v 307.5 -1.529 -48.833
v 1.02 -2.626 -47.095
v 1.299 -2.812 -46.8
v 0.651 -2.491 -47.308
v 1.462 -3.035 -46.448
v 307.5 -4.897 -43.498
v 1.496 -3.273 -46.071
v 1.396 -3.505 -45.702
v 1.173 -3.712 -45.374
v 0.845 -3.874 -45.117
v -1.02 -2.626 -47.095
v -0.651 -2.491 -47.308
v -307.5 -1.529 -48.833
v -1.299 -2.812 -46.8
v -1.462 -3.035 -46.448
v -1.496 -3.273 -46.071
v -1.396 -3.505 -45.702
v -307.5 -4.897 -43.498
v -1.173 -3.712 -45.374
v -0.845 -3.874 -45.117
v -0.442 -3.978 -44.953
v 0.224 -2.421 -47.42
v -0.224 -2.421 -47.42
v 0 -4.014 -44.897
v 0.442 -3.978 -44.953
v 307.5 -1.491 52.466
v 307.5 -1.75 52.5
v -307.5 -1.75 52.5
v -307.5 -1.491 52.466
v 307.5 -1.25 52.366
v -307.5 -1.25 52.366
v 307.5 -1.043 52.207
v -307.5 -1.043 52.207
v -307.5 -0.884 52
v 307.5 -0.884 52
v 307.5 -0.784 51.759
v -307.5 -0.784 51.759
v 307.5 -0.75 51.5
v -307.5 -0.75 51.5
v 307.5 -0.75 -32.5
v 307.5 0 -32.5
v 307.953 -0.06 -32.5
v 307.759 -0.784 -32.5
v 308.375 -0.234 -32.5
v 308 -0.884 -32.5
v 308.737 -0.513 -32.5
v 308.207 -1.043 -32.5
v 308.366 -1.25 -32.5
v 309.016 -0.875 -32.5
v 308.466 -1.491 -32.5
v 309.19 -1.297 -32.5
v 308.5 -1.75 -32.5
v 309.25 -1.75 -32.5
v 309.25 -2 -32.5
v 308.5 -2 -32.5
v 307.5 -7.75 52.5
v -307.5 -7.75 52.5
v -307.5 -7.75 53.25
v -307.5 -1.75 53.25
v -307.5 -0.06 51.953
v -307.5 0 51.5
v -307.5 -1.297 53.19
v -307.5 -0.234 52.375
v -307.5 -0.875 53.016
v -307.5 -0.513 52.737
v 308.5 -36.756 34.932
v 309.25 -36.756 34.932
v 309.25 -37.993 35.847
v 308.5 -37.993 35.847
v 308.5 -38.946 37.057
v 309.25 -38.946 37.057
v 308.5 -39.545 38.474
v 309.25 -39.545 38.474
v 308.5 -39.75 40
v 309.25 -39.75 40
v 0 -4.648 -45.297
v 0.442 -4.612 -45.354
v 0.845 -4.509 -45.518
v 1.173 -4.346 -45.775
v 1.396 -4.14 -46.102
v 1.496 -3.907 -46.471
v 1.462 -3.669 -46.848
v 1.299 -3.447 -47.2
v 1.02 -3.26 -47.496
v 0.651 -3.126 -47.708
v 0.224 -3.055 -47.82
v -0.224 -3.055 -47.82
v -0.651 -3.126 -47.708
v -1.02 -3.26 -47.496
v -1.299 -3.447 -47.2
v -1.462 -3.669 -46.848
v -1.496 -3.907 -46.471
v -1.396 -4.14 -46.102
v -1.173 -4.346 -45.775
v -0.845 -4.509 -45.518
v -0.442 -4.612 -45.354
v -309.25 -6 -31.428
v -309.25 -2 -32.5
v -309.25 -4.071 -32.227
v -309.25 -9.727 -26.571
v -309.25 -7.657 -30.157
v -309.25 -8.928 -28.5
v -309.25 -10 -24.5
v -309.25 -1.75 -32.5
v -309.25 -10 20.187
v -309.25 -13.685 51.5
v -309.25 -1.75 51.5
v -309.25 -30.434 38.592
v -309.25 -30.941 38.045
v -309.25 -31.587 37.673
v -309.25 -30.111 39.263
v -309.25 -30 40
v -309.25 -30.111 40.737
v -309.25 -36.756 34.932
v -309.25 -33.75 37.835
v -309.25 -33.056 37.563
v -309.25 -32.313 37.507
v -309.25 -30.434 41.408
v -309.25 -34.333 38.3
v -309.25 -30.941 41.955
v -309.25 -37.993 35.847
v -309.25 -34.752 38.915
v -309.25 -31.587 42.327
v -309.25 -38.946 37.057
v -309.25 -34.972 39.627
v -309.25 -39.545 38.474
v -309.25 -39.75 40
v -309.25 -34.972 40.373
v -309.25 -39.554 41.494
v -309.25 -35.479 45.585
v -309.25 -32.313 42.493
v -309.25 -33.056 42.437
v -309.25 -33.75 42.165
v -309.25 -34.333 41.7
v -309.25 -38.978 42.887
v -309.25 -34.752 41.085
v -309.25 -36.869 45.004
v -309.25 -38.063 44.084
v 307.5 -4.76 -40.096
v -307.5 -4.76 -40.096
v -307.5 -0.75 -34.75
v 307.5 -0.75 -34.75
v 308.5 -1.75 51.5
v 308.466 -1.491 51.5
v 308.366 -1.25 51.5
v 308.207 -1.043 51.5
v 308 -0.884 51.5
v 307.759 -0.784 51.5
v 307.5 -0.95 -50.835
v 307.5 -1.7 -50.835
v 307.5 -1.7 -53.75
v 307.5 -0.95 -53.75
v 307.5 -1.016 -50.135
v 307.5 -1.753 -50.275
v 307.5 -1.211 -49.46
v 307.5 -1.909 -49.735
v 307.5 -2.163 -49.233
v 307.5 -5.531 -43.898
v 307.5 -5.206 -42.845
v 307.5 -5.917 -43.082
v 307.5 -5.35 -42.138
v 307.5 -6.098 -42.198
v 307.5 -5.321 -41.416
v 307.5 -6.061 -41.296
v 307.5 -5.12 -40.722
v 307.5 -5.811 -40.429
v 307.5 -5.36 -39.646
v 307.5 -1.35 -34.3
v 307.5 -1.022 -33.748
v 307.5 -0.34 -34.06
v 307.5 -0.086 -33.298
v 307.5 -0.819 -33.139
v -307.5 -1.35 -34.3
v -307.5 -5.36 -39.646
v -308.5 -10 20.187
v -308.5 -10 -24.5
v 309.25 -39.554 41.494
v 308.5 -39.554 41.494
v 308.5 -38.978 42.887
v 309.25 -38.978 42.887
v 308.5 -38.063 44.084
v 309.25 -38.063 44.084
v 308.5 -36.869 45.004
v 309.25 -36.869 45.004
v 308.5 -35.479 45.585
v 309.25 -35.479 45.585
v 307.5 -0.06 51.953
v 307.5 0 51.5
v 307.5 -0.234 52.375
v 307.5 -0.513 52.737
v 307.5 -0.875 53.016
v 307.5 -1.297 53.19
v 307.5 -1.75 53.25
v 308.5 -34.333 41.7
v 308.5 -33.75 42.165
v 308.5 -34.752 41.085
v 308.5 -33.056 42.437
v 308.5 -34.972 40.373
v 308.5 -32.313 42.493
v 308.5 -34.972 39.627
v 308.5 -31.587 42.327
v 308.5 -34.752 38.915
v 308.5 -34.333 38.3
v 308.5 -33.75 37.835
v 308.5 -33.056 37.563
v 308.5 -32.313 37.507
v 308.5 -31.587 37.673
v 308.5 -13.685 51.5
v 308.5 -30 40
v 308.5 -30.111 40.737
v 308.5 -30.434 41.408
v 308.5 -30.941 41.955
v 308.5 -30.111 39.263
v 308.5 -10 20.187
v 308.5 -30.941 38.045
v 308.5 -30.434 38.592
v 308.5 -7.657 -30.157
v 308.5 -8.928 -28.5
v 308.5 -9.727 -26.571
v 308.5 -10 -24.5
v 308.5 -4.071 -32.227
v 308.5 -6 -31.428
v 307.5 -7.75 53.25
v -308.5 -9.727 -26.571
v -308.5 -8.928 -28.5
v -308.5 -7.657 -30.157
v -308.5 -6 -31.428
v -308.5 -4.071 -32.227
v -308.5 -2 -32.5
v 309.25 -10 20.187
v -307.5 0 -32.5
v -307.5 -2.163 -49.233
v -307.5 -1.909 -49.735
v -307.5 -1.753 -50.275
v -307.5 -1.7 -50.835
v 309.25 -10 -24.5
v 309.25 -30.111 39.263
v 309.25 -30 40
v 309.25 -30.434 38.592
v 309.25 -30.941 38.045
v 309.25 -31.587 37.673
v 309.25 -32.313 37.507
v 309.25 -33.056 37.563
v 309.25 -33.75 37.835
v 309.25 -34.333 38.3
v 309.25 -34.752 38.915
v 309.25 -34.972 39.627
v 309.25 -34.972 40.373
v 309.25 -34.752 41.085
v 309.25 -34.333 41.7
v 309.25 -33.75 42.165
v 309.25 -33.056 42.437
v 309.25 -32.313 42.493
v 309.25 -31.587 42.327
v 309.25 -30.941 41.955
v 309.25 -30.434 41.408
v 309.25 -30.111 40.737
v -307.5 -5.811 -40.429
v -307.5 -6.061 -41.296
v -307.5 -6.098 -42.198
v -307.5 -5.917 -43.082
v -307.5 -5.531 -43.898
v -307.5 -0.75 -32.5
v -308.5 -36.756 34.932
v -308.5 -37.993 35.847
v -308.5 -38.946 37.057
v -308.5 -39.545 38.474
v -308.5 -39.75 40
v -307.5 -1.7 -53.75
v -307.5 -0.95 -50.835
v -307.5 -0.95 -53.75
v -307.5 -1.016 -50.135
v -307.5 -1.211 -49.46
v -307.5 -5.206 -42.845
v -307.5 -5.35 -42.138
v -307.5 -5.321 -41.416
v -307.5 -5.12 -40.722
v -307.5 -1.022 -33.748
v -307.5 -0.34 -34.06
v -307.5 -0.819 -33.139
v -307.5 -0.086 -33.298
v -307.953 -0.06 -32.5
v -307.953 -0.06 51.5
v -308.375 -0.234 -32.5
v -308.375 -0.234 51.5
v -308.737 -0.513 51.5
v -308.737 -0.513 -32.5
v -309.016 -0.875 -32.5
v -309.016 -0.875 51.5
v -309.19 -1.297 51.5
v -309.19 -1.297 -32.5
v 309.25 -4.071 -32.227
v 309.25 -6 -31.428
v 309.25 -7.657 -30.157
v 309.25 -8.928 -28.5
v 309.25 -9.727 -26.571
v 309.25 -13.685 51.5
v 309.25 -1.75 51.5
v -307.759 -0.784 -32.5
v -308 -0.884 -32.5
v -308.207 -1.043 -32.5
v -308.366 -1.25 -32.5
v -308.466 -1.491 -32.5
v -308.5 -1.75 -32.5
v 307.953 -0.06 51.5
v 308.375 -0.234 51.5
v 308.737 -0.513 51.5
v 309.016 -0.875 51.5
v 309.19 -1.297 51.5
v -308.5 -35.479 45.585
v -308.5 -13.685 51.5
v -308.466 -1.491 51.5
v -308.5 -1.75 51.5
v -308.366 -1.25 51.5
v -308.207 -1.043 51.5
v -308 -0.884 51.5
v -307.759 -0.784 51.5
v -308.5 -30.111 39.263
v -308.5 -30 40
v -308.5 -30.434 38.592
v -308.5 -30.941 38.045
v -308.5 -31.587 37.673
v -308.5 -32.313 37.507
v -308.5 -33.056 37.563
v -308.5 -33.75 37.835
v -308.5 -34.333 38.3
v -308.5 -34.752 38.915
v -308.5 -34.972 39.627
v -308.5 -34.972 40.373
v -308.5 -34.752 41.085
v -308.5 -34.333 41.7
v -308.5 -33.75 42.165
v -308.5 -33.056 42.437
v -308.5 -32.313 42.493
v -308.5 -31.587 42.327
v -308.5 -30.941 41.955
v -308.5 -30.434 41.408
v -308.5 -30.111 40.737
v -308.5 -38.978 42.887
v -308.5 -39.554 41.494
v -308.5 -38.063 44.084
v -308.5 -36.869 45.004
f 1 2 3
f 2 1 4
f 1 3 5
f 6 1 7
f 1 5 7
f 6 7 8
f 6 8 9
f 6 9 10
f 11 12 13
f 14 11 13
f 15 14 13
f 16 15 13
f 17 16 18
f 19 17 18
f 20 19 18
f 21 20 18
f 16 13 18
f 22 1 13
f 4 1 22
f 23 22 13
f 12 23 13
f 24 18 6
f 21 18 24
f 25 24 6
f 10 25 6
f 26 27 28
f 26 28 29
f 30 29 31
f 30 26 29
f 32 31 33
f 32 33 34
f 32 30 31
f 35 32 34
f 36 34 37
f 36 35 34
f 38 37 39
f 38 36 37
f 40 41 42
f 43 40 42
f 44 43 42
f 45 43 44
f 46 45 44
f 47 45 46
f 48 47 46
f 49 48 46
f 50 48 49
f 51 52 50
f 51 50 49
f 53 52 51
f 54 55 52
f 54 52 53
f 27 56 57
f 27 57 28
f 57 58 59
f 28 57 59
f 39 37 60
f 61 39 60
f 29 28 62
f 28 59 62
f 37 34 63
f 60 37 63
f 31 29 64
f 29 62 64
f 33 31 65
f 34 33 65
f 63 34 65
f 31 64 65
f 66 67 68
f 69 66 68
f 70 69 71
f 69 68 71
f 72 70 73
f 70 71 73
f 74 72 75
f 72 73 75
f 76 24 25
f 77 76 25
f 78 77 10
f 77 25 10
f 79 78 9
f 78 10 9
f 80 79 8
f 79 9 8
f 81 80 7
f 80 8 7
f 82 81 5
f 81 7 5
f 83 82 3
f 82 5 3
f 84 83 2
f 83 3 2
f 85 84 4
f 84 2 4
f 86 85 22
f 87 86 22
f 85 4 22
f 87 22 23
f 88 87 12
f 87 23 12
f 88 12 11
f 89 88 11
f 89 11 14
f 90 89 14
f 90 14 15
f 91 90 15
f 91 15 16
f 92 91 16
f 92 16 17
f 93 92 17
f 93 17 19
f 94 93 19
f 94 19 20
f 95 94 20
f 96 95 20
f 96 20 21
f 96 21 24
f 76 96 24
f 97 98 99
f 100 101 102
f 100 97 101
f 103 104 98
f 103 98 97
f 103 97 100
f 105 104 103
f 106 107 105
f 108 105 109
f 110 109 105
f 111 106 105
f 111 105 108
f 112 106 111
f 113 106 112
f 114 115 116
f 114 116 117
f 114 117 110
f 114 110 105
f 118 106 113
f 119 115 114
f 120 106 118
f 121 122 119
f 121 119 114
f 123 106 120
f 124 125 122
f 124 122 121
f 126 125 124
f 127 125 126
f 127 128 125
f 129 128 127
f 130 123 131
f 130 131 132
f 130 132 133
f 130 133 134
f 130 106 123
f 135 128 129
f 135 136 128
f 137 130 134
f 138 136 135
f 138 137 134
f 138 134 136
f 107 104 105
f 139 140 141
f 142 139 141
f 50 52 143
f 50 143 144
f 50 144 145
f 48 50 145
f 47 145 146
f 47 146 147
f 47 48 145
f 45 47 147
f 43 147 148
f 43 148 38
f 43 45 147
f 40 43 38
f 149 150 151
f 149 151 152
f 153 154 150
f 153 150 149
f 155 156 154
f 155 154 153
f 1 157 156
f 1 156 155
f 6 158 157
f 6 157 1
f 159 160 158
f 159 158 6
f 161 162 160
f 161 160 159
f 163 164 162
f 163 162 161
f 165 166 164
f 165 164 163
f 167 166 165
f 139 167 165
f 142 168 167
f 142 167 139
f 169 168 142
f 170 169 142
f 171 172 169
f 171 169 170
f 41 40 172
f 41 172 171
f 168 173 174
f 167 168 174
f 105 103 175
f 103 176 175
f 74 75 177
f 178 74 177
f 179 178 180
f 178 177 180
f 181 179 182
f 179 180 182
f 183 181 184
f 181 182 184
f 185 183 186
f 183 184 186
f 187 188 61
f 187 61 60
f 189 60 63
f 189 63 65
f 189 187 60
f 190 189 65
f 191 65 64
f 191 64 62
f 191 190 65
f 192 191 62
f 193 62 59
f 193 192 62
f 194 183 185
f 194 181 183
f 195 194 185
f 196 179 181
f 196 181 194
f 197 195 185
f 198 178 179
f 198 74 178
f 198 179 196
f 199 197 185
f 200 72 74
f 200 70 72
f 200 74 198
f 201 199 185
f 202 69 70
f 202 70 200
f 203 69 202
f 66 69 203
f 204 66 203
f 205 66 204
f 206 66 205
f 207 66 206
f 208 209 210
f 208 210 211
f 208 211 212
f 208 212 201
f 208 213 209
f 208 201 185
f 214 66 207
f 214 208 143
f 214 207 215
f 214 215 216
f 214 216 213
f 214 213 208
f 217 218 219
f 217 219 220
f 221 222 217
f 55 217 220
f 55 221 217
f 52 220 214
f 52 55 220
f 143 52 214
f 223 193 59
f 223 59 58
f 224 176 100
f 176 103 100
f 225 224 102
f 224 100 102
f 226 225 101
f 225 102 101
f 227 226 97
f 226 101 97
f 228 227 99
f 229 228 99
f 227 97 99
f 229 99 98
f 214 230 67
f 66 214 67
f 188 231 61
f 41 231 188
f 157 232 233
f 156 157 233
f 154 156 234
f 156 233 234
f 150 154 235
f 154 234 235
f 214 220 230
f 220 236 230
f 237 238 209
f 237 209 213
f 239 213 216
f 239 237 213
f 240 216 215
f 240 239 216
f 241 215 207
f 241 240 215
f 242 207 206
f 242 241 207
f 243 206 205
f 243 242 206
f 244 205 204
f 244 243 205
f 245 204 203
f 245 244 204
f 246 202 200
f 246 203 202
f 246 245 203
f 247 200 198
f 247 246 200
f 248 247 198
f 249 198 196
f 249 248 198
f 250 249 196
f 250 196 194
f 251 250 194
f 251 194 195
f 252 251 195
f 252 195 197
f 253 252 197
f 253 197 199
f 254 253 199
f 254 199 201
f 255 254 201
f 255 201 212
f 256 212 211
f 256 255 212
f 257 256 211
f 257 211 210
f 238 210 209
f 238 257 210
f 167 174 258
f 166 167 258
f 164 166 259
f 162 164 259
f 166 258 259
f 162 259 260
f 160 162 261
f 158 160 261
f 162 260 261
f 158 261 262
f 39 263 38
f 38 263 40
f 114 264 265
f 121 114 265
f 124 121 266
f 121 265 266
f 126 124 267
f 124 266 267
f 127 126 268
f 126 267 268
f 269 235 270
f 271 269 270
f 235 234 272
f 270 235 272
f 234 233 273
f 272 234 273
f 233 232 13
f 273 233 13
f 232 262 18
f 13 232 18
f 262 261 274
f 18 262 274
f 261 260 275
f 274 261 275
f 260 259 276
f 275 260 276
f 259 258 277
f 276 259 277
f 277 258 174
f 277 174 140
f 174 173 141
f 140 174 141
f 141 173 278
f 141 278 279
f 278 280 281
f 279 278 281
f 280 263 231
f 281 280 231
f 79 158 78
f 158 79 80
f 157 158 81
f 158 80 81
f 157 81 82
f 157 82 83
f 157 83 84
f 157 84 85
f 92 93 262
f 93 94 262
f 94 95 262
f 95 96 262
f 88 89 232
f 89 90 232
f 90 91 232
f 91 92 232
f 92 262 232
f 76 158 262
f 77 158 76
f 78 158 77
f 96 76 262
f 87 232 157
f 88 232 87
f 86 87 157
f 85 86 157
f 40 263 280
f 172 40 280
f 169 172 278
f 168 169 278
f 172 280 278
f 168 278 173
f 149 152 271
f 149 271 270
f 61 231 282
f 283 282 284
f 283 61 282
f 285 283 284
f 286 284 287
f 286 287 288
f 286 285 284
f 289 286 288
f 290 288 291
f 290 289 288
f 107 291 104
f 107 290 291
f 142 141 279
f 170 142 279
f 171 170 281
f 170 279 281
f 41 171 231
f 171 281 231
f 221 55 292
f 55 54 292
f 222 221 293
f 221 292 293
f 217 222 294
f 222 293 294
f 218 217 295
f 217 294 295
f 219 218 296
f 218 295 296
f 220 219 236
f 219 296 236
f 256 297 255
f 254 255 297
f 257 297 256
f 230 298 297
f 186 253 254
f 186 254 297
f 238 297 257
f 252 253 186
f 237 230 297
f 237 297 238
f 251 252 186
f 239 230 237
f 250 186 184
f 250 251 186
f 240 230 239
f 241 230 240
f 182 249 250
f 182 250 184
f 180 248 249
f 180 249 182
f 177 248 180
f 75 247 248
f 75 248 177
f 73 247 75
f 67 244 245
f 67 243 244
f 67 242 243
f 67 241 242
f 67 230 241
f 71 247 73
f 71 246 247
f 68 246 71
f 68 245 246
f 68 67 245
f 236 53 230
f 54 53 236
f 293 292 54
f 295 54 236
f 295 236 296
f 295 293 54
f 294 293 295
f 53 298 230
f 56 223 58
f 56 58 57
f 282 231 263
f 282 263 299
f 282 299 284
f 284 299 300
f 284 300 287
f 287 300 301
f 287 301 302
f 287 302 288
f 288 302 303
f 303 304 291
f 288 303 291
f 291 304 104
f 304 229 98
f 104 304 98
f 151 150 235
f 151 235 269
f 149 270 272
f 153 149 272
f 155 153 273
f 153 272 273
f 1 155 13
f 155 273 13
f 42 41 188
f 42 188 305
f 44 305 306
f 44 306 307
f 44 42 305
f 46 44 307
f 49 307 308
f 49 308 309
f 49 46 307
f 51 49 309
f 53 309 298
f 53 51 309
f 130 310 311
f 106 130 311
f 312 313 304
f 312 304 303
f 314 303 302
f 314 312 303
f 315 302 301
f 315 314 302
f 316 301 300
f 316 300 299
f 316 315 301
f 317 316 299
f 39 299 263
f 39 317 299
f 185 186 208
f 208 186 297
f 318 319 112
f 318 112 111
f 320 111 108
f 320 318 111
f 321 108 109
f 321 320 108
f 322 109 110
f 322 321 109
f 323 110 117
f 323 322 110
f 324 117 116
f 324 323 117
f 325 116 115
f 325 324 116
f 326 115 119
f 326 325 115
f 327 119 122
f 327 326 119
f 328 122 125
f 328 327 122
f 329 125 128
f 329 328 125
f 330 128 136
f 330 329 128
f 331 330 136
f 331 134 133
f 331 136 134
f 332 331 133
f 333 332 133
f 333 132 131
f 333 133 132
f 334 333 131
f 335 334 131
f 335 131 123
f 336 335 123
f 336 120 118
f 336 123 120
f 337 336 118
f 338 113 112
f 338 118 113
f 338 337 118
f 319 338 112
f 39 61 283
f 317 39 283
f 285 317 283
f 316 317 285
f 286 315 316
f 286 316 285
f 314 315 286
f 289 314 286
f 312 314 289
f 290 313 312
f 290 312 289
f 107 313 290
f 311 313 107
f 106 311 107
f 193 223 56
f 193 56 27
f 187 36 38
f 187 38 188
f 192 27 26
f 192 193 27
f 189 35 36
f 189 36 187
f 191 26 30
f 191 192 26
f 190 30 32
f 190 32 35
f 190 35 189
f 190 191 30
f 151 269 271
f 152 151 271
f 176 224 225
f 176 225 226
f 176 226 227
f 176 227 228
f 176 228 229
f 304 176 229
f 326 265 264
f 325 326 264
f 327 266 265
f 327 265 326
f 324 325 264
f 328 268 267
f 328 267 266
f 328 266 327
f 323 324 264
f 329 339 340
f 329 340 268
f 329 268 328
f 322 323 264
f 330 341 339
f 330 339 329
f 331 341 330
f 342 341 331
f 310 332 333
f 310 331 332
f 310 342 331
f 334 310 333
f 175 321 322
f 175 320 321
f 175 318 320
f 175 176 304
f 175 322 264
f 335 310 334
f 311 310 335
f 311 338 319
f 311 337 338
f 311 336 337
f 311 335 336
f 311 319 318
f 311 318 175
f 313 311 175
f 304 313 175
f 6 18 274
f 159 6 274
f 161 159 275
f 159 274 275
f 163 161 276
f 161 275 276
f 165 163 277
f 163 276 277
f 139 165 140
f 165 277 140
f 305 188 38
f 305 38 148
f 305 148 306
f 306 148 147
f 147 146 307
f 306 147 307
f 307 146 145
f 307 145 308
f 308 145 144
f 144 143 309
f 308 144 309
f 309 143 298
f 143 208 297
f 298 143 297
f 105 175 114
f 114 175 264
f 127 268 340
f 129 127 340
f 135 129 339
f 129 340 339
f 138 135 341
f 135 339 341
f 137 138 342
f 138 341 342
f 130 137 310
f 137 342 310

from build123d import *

# Parameters (mm, degrees)
SKETCH1_W                    = 615
SKETCH1_H                    = 105
BASE_FLANGE1_DEPTH           = 0.75
EDGE_FLANGE1_STRIP_W         = 5
EDGE_FLANGE1_STRIP_H         = 0.75
EDGE_FLANGE1_STRIP_CUT_DEPTH = 615
EDGE_FLANGE1_DEPTH           = 615
SKETCH16_W                   = 615
SKETCH16_H                   = 196.52545168
CUT_EXTRUDE1_DEPTH           = 10
SWEPT_START                  = -307.5
SWEPT_FLANGE1_DEPTH          = 615
EDGE_FLANGE2_DEPTH           = 84
EDGE_FLANGE2_BEND_DEPTH      = 84
CUT_EXTRUDE2_DEPTH           = 623.102383053
CUT_EXTRUDE2_DEPTH_BACK      = 623.102383053
SKETCH39_R                   = 2.5
FILLET1_R                    = 8
SKETCH40_R                   = 1.5
CUT_EXTRUDE3_DEPTH           = 10


# Read off the part's stored shape, not the designer's step: Swept Flange1
# Sheet-metal steps are written as plain solids
with BuildPart() as part:
    # Sketch1 → Base-Flange1 (new body)
    with BuildSketch(Plane(origin=(0, 0, 0), x_dir=(1, 0, 0), z_dir=(0, 1, 0))):
        Rectangle(SKETCH1_W, SKETCH1_H)
    extrude(amount=-BASE_FLANGE1_DEPTH)

    # Edge-Flange1 strip (across the edge) → Edge-Flange1 strip cut (cut)
    with BuildSketch(Plane(origin=(307.5, -0.75, 52.5), x_dir=(0, 0, -1), z_dir=(-1, 0, 0))):
        with Locations((-1.5, -0.375)):
            Rectangle(EDGE_FLANGE1_STRIP_W, EDGE_FLANGE1_STRIP_H)
    extrude(amount=EDGE_FLANGE1_STRIP_CUT_DEPTH, mode=Mode.SUBTRACT)

    # Edge-Flange1 section (across the edge) → Edge-Flange1 (add)
    with BuildSketch(Plane(origin=(307.5, -0.75, 52.5), x_dir=(0, 0, -1), z_dir=(-1, 0, 0))):
        with BuildLine():
            Line((-0.75, 1), (-0.75, 7))
            Line((-0.75, 7), (0, 7))
            Line((0, 7), (0, 1))
            ThreePointArc((0, 1), (0.292893219, 0.292893219), (1, 0))
            Line((1, 0), (1, -0.75))
            ThreePointArc((1, -0.75), (-0.237436867, -0.237436867), (-0.75, 1))
        make_face()
    extrude(amount=EDGE_FLANGE1_DEPTH)

    # Sketch16 → Cut-Extrude1 (cut)
    with BuildSketch(Plane(origin=(0, 0, 0), x_dir=(1, 0, 0), z_dir=(0, 1, 0))):
        with Locations((0, 130.76272584)):
            Rectangle(SKETCH16_W, SKETCH16_H)
    extrude(amount=-CUT_EXTRUDE1_DEPTH, mode=Mode.SUBTRACT)

    # Swept Flange1 outline → Swept Flange1 (add)
    with BuildSketch(Plane.YZ.offset(SWEPT_START)):
        with BuildLine():
            Line((-1.7, -50.834586207), (-1.7, -53.75))
            Line((-1.7, -53.75), (-0.95, -53.75))
            Line((-0.95, -53.75), (-0.95, -50.834586207))
            ThreePointArc((-0.95, -50.834586207), (-1.097642895, -49.792701719), (-1.528945753, -48.832858214))
            Line((-1.528945753, -48.832858214), (-4.896680845, -43.497832325))
            ThreePointArc((-4.896680845, -43.497832325), (-5.357412506, -41.775852388), (-4.759837447, -40.09644993))
            Line((-4.759837447, -40.09644993), (-0.75, -34.75))
            ThreePointArc((-0.75, -34.75), (-0.192437632, -33.685854123), (0, -32.5))
            Line((0, -32.5), (-0.75, -32.5))
            ThreePointArc((-0.75, -32.5), (-0.903950106, -33.448683298), (-1.35, -34.3))
            Line((-1.35, -34.3), (-5.359837447, -39.64644993))
            ThreePointArc((-5.359837447, -39.64644993), (-6.106806271, -41.745703002), (-5.530891695, -43.898177923))
            Line((-5.530891695, -43.898177923), (-2.163156602, -49.233203812))
            ThreePointArc((-2.163156602, -49.233203812), (-1.818114316, -50.001078617), (-1.7, -50.834586207))
        make_face()
    extrude(amount=SWEPT_FLANGE1_DEPTH)

    # Edge-Flange2 section (across the edge) → Edge-Flange2 (add)
    with BuildSketch(Plane(origin=(308.5, -0.75, -32.5), x_dir=(-1, 0, 0), z_dir=(0, 0, 1))):
        with BuildLine():
            Line((-0.75, 1), (-0.75, 39))
            Line((-0.75, 39), (0, 39))
            Line((0, 39), (0, 1))
            ThreePointArc((0, 1), (0.292893219, 0.292893219), (1, 0))
            Line((1, 0), (1, -0.75))
            ThreePointArc((1, -0.75), (-0.237436867, -0.237436867), (-0.75, 1))
        make_face()
    extrude(amount=EDGE_FLANGE2_DEPTH)

    # Edge-Flange2 section 2 (across the edge) → Edge-Flange2 bend (add)
    with BuildSketch(Plane(origin=(-308.5, -0.75, 51.5), x_dir=(1, 0, 0), z_dir=(0, 0, -1))):
        with BuildLine():
            Line((-0.75, 1), (-0.75, 39))
            Line((-0.75, 39), (0, 39))
            Line((0, 39), (0, 1))
            ThreePointArc((0, 1), (0.292893219, 0.292893219), (1, 0))
            Line((1, 0), (1, -0.75))
            ThreePointArc((1, -0.75), (-0.237436867, -0.237436867), (-0.75, 1))
        make_face()
    extrude(amount=EDGE_FLANGE2_BEND_DEPTH)

    # Sketch39 → Cut-Extrude2 (cut, two sides: drawn at the far end of the back side and taken through both)
    with BuildSketch(Plane.ZY.offset(309.25).offset(-CUT_EXTRUDE2_DEPTH_BACK)):
        with Locations(Location((40, -32.5, 0), (0, 0, 90))):
            Circle(SKETCH39_R)
        with BuildLine():
            Line((-32.5, -10), (20.187006795, -10))
            Line((20.187006795, -10), (34.931706284, -36.756092926))
            ThreePointArc((34.931706284, -36.756092926), (37.056741569, -38.945618932), (40, -39.75))
            ThreePointArc((40, -39.75), (43.515434794, -38.559838948), (45.58487621, -35.47890121))
            Line((45.58487621, -35.47890121), (51.5, -13.685469847))
            Line((51.5, -13.685469847), (60.41713226, -13.685469847))
            Line((60.41713226, -13.685469847), (60.41713226, -59.649041705))
            Line((60.41713226, -59.649041705), (-51.871278106, -59.649041705))
            Line((-51.871278106, -59.649041705), (-51.871278106, -10))
            Line((-51.871278106, -10), (-32.5, -10))
        make_face()
    extrude(amount=CUT_EXTRUDE2_DEPTH + CUT_EXTRUDE2_DEPTH_BACK, mode=Mode.SUBTRACT)

    # Fillet1
    fillet1_edges = [part.edges().sort_by_distance(p)[0] for p in [
        (308.875, -10, -32.5),
        (-308.875, -10, -32.5),
    ]]
    fillet(fillet1_edges, radius=FILLET1_R)

    # Sketch40 → Cut-Extrude3 (cut)
    with BuildSketch(Plane(origin=(0, -23.135666601, -14.604389542), x_dir=(1, 0, 0), z_dir=(0, 0.8456144659552722, 0.5337941316342656))):
        with Locations(Location((0, 37.3231029, 0), (0, 0, 270))):
            Circle(SKETCH40_R)
    extrude(amount=-CUT_EXTRUDE3_DEPTH, mode=Mode.SUBTRACT)


solid = part.part
